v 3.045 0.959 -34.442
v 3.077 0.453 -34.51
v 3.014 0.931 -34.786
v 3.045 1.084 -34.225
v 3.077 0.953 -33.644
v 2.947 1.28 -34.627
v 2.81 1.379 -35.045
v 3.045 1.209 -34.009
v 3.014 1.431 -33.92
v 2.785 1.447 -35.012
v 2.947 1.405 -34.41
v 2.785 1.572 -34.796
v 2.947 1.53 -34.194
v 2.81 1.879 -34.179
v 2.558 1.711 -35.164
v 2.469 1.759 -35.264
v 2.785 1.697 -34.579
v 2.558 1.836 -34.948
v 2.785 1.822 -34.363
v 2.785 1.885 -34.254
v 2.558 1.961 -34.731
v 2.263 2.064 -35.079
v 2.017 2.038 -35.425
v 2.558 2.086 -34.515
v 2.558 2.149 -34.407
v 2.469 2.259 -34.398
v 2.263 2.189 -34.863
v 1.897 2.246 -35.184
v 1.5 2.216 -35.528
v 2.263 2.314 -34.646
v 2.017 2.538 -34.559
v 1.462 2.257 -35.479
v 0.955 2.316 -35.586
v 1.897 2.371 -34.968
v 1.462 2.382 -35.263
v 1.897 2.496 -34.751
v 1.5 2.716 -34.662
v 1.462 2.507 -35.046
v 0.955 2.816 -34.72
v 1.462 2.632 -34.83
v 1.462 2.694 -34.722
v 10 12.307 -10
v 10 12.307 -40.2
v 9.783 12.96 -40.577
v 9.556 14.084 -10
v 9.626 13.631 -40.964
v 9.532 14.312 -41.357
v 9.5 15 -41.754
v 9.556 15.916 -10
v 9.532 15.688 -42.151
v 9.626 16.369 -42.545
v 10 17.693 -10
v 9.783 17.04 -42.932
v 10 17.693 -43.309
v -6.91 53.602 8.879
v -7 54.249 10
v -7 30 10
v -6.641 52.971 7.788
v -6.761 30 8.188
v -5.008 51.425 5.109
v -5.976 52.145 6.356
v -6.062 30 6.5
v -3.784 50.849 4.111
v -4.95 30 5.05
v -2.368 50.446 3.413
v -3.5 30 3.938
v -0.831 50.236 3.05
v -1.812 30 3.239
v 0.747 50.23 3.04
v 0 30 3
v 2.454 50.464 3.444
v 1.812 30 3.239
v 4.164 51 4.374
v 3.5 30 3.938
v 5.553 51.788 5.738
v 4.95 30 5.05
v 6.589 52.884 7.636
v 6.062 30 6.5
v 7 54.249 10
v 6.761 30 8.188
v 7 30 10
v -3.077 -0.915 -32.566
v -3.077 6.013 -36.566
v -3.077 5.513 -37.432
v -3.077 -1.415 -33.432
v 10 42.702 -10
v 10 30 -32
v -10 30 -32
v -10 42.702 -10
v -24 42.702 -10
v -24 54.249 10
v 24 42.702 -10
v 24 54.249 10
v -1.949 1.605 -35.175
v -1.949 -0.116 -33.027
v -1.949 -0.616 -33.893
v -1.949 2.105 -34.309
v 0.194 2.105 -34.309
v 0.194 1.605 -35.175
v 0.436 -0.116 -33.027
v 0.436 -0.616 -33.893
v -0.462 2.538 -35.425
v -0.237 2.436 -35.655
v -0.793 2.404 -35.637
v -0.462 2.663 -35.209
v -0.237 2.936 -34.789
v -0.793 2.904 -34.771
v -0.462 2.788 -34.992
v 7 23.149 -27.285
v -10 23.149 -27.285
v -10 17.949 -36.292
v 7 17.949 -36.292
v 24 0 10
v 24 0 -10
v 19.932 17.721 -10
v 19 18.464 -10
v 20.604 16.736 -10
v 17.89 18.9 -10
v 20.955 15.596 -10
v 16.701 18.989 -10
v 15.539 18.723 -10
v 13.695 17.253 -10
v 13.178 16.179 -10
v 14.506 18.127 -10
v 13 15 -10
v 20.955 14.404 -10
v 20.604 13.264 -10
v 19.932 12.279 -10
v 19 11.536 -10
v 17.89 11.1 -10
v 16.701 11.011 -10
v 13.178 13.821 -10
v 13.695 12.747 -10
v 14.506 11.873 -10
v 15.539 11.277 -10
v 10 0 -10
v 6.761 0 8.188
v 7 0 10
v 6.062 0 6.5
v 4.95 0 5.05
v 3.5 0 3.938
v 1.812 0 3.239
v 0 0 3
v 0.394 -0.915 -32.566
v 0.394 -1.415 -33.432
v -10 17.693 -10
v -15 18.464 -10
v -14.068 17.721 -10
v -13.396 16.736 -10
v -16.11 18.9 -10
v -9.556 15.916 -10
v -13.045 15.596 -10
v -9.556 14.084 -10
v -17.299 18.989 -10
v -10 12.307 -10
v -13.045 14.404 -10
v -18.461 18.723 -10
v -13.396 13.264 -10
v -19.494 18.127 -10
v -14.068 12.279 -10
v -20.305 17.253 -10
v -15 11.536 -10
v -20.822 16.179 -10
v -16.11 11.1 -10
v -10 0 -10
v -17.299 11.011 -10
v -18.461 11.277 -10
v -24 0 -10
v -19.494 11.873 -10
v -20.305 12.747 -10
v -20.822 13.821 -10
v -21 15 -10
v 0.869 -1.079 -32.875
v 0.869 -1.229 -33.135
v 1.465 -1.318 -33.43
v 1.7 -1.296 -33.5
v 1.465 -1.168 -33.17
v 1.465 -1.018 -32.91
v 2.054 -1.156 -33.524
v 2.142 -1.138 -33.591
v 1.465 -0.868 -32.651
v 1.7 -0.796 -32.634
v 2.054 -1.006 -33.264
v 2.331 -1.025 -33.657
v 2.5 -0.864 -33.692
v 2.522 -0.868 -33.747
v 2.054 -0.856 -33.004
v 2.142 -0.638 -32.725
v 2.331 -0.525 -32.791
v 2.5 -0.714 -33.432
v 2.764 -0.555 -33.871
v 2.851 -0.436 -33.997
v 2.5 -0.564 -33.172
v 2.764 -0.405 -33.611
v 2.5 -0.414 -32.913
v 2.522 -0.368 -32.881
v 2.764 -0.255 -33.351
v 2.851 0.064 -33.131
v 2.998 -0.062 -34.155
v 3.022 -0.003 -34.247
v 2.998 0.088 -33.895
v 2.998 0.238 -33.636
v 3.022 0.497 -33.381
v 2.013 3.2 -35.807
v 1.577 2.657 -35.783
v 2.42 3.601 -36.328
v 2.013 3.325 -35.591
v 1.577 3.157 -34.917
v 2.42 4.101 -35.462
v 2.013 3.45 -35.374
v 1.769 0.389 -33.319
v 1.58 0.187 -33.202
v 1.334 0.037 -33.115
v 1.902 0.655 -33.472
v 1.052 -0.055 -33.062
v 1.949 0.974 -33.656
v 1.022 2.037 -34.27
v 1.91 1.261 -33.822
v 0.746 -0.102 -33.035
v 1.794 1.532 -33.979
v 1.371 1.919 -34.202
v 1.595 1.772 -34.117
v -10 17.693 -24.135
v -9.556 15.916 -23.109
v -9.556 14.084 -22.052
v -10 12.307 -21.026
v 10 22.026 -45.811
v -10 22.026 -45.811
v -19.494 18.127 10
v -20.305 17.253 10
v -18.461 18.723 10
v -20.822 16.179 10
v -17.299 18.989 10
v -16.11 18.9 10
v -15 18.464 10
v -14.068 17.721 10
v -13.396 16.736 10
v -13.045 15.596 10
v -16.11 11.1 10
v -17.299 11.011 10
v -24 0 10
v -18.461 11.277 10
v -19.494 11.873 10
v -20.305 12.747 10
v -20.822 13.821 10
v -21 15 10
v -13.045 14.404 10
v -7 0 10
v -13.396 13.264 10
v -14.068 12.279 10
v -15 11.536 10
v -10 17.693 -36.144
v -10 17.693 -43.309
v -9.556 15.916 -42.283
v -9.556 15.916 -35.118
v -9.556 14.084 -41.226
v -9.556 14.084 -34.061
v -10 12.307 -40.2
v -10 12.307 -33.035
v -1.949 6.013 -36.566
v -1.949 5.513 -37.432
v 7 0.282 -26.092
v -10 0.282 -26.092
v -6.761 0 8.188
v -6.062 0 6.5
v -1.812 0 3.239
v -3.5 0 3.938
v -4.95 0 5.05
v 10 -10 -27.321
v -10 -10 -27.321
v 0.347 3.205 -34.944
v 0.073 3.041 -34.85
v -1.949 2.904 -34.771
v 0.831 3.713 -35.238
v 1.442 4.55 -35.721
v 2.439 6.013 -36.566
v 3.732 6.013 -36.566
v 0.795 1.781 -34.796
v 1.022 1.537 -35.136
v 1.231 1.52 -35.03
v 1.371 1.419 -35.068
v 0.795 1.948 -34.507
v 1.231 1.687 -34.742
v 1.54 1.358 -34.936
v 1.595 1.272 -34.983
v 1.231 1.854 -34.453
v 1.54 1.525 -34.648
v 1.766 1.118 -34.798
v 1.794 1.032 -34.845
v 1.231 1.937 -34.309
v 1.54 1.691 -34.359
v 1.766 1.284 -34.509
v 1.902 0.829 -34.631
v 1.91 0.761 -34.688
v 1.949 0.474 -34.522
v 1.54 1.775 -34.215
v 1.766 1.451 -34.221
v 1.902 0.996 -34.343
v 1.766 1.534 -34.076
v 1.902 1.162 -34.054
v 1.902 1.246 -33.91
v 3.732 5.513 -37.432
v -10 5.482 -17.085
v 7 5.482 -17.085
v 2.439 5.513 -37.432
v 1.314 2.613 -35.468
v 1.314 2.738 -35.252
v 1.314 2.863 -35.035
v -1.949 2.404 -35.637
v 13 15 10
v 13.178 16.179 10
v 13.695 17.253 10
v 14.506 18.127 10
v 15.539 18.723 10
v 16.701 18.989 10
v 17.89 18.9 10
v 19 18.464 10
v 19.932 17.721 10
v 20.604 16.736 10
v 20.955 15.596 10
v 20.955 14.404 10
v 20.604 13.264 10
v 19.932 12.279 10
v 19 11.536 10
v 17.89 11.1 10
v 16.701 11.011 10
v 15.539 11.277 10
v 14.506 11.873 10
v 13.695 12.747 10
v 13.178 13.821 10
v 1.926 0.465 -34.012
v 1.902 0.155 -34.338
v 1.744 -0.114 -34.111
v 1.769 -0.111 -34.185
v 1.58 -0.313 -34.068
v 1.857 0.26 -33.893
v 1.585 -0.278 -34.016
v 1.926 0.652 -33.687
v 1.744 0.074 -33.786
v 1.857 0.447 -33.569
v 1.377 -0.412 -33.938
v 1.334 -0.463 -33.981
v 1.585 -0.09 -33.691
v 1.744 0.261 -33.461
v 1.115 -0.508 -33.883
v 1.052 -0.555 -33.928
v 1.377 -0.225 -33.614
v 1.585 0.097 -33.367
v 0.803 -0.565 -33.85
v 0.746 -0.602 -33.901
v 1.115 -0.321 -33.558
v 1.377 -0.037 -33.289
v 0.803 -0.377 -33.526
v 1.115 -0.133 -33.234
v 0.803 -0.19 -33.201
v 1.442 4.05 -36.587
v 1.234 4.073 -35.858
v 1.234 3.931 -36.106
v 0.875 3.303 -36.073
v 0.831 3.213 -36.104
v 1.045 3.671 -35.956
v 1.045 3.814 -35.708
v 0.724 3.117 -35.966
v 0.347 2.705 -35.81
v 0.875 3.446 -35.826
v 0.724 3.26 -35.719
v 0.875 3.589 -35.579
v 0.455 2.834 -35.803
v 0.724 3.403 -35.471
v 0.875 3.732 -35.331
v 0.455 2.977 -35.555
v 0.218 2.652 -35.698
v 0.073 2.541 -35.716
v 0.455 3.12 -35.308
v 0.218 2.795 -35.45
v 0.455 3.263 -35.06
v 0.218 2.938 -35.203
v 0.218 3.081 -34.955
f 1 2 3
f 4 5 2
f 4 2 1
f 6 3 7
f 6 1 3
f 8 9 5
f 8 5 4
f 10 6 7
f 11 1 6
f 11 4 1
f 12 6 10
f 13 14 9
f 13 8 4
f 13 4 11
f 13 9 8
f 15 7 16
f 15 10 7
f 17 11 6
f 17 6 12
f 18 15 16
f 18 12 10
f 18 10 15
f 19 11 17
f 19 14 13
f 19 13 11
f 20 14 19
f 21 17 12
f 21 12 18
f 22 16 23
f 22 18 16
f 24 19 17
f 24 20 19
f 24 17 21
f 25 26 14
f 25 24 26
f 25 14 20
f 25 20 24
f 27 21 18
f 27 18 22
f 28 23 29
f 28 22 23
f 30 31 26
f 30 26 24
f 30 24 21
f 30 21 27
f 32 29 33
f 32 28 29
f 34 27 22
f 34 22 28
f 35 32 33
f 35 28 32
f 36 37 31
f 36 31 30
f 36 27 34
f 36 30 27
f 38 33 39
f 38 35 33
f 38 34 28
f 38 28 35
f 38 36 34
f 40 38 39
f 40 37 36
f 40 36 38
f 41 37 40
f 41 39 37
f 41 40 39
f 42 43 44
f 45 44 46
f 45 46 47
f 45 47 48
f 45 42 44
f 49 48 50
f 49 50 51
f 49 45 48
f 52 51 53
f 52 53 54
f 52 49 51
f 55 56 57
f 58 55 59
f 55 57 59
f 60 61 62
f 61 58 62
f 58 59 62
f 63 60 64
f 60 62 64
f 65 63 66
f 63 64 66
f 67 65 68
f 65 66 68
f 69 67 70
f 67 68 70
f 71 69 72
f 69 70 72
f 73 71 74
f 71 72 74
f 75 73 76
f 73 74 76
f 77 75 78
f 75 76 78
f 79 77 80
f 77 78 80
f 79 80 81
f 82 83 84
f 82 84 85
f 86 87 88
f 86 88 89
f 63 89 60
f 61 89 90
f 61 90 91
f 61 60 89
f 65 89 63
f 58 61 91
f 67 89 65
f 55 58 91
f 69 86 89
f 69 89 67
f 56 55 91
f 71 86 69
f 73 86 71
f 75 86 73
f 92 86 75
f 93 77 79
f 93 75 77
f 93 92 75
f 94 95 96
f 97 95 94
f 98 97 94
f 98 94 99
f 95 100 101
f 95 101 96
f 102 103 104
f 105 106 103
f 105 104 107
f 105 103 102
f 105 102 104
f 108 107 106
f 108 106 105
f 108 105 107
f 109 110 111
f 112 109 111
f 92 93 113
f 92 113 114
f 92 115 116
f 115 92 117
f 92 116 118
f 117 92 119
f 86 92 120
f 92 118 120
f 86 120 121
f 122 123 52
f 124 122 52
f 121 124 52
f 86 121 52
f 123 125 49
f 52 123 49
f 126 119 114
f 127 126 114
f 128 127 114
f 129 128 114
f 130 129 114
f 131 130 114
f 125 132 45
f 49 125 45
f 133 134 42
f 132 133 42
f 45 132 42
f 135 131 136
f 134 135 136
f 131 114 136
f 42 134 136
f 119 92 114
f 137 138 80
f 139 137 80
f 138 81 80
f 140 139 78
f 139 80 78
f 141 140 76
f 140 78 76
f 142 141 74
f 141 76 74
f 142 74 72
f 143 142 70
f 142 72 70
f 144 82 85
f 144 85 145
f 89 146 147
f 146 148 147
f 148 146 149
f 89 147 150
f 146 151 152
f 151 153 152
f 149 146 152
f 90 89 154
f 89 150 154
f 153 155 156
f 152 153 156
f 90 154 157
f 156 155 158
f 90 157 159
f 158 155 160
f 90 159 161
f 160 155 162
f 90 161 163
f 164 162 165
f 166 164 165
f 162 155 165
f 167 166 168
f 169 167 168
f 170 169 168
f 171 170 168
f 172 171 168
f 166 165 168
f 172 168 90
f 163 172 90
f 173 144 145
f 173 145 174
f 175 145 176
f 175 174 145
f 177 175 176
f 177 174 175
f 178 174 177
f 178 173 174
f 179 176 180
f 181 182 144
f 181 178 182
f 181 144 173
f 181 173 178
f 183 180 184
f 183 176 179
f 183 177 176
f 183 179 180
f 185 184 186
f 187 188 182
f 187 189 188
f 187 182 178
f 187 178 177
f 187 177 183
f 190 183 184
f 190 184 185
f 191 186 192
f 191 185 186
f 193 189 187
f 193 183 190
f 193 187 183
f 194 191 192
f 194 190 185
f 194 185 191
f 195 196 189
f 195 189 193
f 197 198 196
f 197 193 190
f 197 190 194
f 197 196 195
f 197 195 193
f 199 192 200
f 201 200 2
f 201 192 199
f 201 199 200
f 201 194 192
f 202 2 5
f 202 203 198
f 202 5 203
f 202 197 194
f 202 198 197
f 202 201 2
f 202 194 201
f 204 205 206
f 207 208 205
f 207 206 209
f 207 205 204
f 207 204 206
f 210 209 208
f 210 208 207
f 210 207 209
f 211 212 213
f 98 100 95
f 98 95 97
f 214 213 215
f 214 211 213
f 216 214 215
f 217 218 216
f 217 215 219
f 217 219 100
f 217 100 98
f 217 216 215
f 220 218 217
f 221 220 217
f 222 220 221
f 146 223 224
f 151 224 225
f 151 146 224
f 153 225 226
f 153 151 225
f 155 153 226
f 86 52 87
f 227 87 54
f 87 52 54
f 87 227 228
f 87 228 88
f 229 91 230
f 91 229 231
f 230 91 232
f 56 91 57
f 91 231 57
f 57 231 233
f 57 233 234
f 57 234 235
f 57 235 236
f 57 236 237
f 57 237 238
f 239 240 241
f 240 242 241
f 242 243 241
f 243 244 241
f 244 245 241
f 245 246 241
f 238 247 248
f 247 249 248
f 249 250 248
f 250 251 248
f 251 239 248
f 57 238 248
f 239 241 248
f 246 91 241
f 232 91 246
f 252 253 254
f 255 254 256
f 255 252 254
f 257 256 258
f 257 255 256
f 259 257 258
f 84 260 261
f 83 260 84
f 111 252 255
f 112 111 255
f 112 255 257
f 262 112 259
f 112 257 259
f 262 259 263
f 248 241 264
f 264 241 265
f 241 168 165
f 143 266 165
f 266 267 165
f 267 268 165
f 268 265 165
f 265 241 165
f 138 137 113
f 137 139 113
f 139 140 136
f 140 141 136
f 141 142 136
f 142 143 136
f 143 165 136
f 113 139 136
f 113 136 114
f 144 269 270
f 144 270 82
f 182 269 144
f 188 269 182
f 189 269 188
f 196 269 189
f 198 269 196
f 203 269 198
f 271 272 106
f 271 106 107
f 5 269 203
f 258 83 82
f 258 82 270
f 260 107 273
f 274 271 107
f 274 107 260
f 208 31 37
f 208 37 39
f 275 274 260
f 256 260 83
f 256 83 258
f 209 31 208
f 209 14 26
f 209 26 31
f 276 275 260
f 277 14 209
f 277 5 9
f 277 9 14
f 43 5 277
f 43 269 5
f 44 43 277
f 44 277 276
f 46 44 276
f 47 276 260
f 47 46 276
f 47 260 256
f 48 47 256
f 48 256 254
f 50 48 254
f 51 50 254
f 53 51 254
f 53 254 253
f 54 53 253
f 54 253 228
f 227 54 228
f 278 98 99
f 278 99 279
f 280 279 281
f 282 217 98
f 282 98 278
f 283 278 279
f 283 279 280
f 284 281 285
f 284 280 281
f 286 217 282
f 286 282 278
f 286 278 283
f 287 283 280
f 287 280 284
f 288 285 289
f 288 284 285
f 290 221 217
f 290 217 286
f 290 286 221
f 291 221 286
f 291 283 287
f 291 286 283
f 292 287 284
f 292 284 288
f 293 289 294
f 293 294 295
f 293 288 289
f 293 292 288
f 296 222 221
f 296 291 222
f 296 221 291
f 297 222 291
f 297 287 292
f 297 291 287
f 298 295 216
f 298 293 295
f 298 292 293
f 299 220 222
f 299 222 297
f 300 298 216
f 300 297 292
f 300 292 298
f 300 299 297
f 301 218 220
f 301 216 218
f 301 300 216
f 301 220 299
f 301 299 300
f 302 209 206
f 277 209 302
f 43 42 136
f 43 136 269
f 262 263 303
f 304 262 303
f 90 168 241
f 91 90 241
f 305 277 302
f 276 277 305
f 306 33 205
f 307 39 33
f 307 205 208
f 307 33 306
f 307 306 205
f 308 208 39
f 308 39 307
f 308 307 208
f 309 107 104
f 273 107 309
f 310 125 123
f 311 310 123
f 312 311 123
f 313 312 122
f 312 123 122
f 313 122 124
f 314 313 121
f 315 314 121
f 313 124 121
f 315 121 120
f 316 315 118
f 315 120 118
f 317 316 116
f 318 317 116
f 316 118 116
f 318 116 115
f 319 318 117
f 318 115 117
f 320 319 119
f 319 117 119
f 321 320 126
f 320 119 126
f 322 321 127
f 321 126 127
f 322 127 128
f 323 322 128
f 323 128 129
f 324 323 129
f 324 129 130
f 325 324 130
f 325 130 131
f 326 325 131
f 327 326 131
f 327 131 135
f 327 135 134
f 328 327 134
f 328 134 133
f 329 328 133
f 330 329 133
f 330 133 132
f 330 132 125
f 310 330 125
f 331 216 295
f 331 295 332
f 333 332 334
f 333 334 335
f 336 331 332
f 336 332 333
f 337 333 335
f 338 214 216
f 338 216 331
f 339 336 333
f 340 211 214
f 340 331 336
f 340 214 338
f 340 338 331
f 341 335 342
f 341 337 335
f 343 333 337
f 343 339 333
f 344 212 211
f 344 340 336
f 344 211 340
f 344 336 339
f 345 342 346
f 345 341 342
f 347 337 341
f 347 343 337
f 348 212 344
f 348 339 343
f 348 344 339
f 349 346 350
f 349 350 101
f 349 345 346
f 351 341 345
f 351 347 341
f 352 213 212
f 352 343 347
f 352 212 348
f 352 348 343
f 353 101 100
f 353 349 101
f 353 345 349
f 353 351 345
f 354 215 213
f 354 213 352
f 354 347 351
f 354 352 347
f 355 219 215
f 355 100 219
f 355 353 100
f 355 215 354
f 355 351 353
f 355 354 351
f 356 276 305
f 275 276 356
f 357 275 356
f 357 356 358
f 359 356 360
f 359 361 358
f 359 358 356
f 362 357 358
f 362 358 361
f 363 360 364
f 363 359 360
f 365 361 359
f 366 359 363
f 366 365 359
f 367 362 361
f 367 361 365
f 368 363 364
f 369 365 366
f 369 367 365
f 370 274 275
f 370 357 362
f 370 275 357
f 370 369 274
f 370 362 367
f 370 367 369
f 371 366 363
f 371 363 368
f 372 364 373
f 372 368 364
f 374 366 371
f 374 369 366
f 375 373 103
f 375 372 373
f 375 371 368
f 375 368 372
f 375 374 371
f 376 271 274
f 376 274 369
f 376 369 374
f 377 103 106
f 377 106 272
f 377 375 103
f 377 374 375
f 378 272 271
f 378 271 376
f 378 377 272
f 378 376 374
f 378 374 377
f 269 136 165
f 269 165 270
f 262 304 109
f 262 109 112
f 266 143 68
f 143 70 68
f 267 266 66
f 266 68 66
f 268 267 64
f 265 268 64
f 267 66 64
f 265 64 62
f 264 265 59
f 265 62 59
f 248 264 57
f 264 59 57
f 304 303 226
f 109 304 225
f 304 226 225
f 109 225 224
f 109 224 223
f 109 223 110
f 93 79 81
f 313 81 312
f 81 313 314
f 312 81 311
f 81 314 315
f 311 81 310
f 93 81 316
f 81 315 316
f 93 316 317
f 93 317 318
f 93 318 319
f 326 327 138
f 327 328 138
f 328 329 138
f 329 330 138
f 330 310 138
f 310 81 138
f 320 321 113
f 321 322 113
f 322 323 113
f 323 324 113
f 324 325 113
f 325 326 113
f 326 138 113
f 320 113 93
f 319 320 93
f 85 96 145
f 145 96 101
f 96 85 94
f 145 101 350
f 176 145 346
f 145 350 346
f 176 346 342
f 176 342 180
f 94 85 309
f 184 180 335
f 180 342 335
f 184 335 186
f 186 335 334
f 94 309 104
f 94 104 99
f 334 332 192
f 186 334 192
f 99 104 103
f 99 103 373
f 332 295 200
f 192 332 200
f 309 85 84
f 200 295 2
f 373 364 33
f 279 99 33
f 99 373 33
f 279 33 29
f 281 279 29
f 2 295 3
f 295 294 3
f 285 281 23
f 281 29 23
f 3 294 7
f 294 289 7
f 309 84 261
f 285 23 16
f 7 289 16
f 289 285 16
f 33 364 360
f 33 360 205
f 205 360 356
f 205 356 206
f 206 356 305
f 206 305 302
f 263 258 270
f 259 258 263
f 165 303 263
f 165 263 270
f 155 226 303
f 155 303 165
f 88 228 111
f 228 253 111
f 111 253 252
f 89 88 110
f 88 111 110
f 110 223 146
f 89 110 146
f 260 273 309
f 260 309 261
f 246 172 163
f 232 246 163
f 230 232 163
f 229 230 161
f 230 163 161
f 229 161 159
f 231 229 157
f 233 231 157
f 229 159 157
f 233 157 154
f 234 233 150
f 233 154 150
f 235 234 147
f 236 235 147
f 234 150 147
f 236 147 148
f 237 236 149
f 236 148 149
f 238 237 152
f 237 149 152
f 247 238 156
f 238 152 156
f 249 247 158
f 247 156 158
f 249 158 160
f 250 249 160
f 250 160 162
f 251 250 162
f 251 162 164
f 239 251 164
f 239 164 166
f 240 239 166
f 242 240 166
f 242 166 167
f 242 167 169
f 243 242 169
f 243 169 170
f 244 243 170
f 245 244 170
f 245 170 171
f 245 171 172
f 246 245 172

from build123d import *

# Parameters (mm, degrees)
SKETCH_1_W              = 48
SKETCH_1_H              = 20
EXTRUDE_1_DEPTH         = 30
SKETCH_2_W              = 14
SKETCH_2_H              = 30
CUT_EXTRUDE_1_DEPTH     = 7
EXTRUDE_2_DEPTH         = 48
CUT_EXTRUDE_2_DEPTH     = 14
CUT_EXTRUDE_3_DEPTH     = 14
CUT_EXTRUDE_4_DEPTH     = 65.456478054
SKETCH_13_R             = 4
CUT_EXTRUDE_5_DEPTH     = 53.52066051
SKETCH_14_R             = 4
CUT_EXTRUDE_6_DEPTH     = 53.52066051
FILLET_1_R              = 7
EXTRUDE_3_DEPTH         = 3
EXTRUDE_5_DEPTH         = 1
SKETCH_20_R             = 7.5
CUT_EXTRUDE_8_DEPTH     = 53.520660579
BOSS_EXTRUDE1_DEPTH     = 25
CUT_EXTRUDE1_DEPTH      = 80.244164279
CUT_EXTRUDE1_DEPTH_BACK = 80.244164279


with BuildPart() as part:
    # Эскиз1 → Бобышка-Вытянуть1 (new body)
    with BuildSketch(Plane(origin=(0, 0, 0), x_dir=(1, 0, 0), z_dir=(0, 1, 0))):
        Rectangle(SKETCH_1_W, SKETCH_1_H)
    extrude(amount=EXTRUDE_1_DEPTH)

    # Эскиз2 → Вырез-Вытянуть1 (cut)
    with BuildSketch(Plane.XY.offset(10)):
        with Locations((0, 15)):
            Rectangle(SKETCH_2_W, SKETCH_2_H)
    extrude(amount=-CUT_EXTRUDE_1_DEPTH, mode=Mode.SUBTRACT)

    # Эскиз7 → Бобышка-Вытянуть2 (add)
    with BuildSketch(Plane(origin=(24, 0, 0), x_dir=(0, 0, -1), z_dir=(1, 0, 0))):
        Polygon((10, 0), (27.320508076, -10), (45.810889132, 22.026279442), (32, 30), (10, 30), align=None)
    extrude(amount=-EXTRUDE_2_DEPTH)

    # Эскиз8 → Вырез-Вытянуть2 (cut)
    with BuildSketch(Plane(origin=(24, 0, 0), x_dir=(0, 0, -1), z_dir=(1, 0, 0))):
        Polygon((10, 0), (10, 30), (32, 30), (45.810889132, 22.026279442), (27.320508076, -10), align=None)
    extrude(amount=-CUT_EXTRUDE_2_DEPTH, mode=Mode.SUBTRACT)

    # Эскиз9 → Вырез-Вытянуть3 (cut)
    with BuildSketch(Plane.ZY.offset(24)):
        Polygon((-10, 0), (-10, 30), (-32, 30), (-45.810889132, 22.026279442), (-27.320508076, -10), align=None)
    extrude(amount=-CUT_EXTRUDE_3_DEPTH, mode=Mode.SUBTRACT)

    # Эскиз11 → Вырез-Вытянуть4 (cut, through all)
    with BuildSketch(Plane.ZY.offset(10)):
        Polygon((-17.085266521, 5.482226936), (-27.285266521, 23.149145173), (-36.291930721, 17.949145173), (-26.091930721, 0.282226936), align=None)
    extrude(amount=-CUT_EXTRUDE_4_DEPTH, mode=Mode.SUBTRACT)

    # Эскиз13 → Вырез-Вытянуть5 (cut, through all)
    with BuildSketch(Plane(origin=(0, 0, -10), x_dir=(-1, 0, 0), z_dir=(0, 0, -1))):
        with Locations((17, 15)):
            Circle(SKETCH_13_R)
    extrude(amount=-CUT_EXTRUDE_5_DEPTH, mode=Mode.SUBTRACT)

    # Эскиз14 → Вырез-Вытянуть6 (cut, through all)
    with BuildSketch(Plane(origin=(0, 0, -10), x_dir=(-1, 0, 0), z_dir=(0, 0, -1))):
        with Locations((-17, 15)):
            Circle(SKETCH_14_R)
    extrude(amount=-CUT_EXTRUDE_6_DEPTH, mode=Mode.SUBTRACT)

    # Скругление1
    fillet_1_edges = [part.edges().sort_by_distance(p)[0] for p in [
        (-7, 15, 3),
        (7, 15, 3),
    ]]
    fillet(fillet_1_edges, radius=FILLET_1_R - 0.0001)  # a hair under: the kernel refuses the full size

    # Эскиз16 → Бобышка-Вытянуть3 (add)
    with BuildSketch(Plane(origin=(10, 0, 0), x_dir=(0, 0, -1), z_dir=(1, 0, 0))):
        Polygon((27.285266521, 23.149145173), (17.085266521, 5.482226936), (26.091930721, 0.282226936), (36.291930721, 17.949145173), align=None)
    extrude(amount=-EXTRUDE_3_DEPTH)

    # Эскиз18 → Бобышка-Вытянуть5 (add)
    with BuildSketch(Plane(origin=(0, -14.330127019, -24.820508076), x_dir=(-1, 0, 0), z_dir=(0, -0.4999999999999885, -0.8660254037844454))):
        with BuildLine():
            Line((3.076923077, 23.490381057), (3.076923077, 15.490381057))
            Line((3.076923077, 15.490381057), (-0.394230769, 15.490381057))
            add(Edge.make_bspline(
                [(-0.394230769, 15.490381057), (-0.475966203, 15.49101845), (-0.634155568, 15.49225205), (-0.863556464, 15.501067061), (-1.077173272, 15.519794557), (-1.276352297, 15.540710881), (-1.460752713, 15.571594241), (-1.630462401, 15.607825992), (-1.784830485, 15.650647709), (-1.925031539, 15.701264755), (-2.055118116, 15.758511595), (-2.175664232, 15.829183977), (-2.291845901, 15.906492451), (-2.399031866, 15.998074814), (-2.502049745, 16.096470161), (-2.596586483, 16.206601733), (-2.685439891, 16.325713037), (-2.793473896, 16.498197991), (-2.906939016, 16.729401784), (-3.004668447, 17.02314385), (-3.06681146, 17.330727068), (-3.073519576, 17.5408315), (-3.076923077, 17.647432339)],
                knots=[0, 0, 0, 0, 1.242075696, 2.40389213, 3.487198984, 4.500157661, 5.446319301, 6.326791195, 7.136300648, 7.878370406, 8.590488565, 9.292260633, 9.999224673, 10.708050372, 11.431369221, 12.162165018, 12.910600795, 13.687589445, 15.252257874, 16.810406251, 18.381693487, 20, 20, 20, 20], degree=3))
            add(Edge.make_bspline(
                [(-3.076923077, 17.647432339), (-3.075357604, 17.715865612), (-3.072265688, 17.851026019), (-3.048581646, 18.049748215), (-3.005726368, 18.239618444), (-2.950775925, 18.42230348), (-2.87555432, 18.595200652), (-2.788453183, 18.761894703), (-2.680395045, 18.917607923), (-2.559742342, 19.067544403), (-2.419445088, 19.204937793), (-2.263386964, 19.331922341), (-2.086876234, 19.440896432), (-1.89570213, 19.542168691), (-1.684937787, 19.625339579), (-1.457761732, 19.698574242), (-1.21241575, 19.755040234), (-1.042362796, 19.783482773), (-0.955128205, 19.798073364)],
                knots=[0, 0, 0, 0, 0.982645791, 1.940792824, 2.867691729, 3.775150443, 4.675643875, 5.571354211, 6.471357401, 7.392684514, 8.331098131, 9.285922955, 10.275520706, 11.304845665, 12.388884831, 13.524255008, 14.729980297, 16, 16, 16, 16], degree=3))
            add(Edge.make_bspline(
                [(-0.955128205, 19.798073364), (-1.019738399, 19.830278555), (-1.14226585, 19.891352818), (-1.308999482, 19.992404668), (-1.455065559, 20.087536339), (-1.53803712, 20.158871679), (-1.576923077, 20.192304134)],
                knots=[0, 0, 0, 0, 1.172551213, 2.223638478, 3.167479604, 4, 4, 4, 4], degree=3))
            add(Edge.make_bspline(
                [(-1.576923077, 20.192304134), (-1.652624383, 20.266285408), (-1.807875296, 20.418008818), (-2.019735444, 20.678834883), (-2.229368535, 20.965668904), (-2.355227865, 21.174690137), (-2.419871795, 21.282047723)],
                knots=[0, 0, 0, 0, 0.918170575, 1.883016652, 2.912673989, 4, 4, 4, 4], degree=3))
            Line((-2.419871795, 21.282047723), (-3.732371795, 23.490381057))
            Line((-3.732371795, 23.490381057), (-2.439102564, 23.490381057))
            Line((-2.439102564, 23.490381057), (-1.442307692, 21.801278493))
            add(Edge.make_bspline(
                [(-1.442307692, 21.801278493), (-1.406465761, 21.74201577), (-1.337009983, 21.627174345), (-1.236719552, 21.459429826), (-1.138255761, 21.30508177), (-1.047376022, 21.15932531), (-0.958316878, 21.02600434), (-0.878481314, 20.900073272), (-0.798305584, 20.788666158), (-0.706246053, 20.654823189), (-0.593818414, 20.510114732), (-0.462623309, 20.361457059), (-0.34199814, 20.238315643), (-0.18956943, 20.120822362), (-3.2323e-05, 20.013245791), (0.159774488, 19.962214344), (0.237179487, 19.937496441)],
                knots=[0, 0, 0, 0, 1.130591283, 2.190900266, 3.190104209, 4.119071823, 4.994606968, 5.807262858, 6.55236009, 7.234593472, 8.459046683, 9.540234366, 10.471327768, 11.266723835, 12.676093724, 14, 14, 14, 14], degree=3))
            add(Edge.make_bspline(
                [(0.237179487, 19.937496441), (0.269697183, 19.931632396), (0.343936058, 19.918244603), (0.469993483, 19.909501015), (0.622727518, 19.900220866), (0.733416476, 19.900491258), (0.793269231, 19.900637467)],
                knots=[0, 0, 0, 0, 0.709978628, 1.620902492, 2.713552433, 4, 4, 4, 4], degree=3))
            Line((0.793269231, 19.900637467), (1.948717949, 19.900637467))
            Line((1.948717949, 19.900637467), (1.948717949, 23.490381057))
            Line((1.948717949, 23.490381057), (3.076923077, 23.490381057))
        make_face()
        with BuildLine():
            Line((1.948717949, 18.977560544), (-0.193910256, 18.977560544))
            add(Edge.make_bspline(
                [(-0.193910256, 18.977560544), (-0.301354607, 18.97589409), (-0.502211742, 18.972778811), (-0.783007271, 18.945769758), (-1.023200158, 18.903550736), (-1.225858519, 18.839427155), (-1.396173113, 18.753553027), (-1.54378517, 18.648537277), (-1.667901131, 18.51825252), (-1.769975791, 18.368861713), (-1.849770319, 18.206056724), (-1.90552669, 18.03374763), (-1.942959563, 17.855238544), (-1.946787014, 17.733092852), (-1.948717949, 17.6714708)],
                knots=[0, 0, 0, 0, 1.546056516, 2.890207646, 4.055830773, 5.050253158, 5.937355789, 6.790906573, 7.644595853, 8.512568064, 9.38593768, 10.244184789, 11.114197691, 12, 12, 12, 12], degree=3))
            add(Edge.make_bspline(
                [(-1.948717949, 17.6714708), (-1.947235583, 17.626563151), (-1.944332064, 17.538602257), (-1.928948857, 17.409542216), (-1.89968097, 17.287236957), (-1.859266003, 17.17080484), (-1.808094758, 17.059993077), (-1.745213393, 16.955237495), (-1.670946372, 16.857073145), (-1.585753391, 16.765016757), (-1.487970747, 16.681241729), (-1.376270424, 16.608965458), (-1.251544399, 16.547545272), (-1.113644587, 16.498798364), (-0.963006292, 16.459808698), (-0.798771701, 16.43387015), (-0.621691971, 16.415101097), (-0.498985984, 16.414015918), (-0.435897436, 16.41345798)],
                knots=[0, 0, 0, 0, 0.965235723, 1.89061323, 2.787065514, 3.661873922, 4.534873316, 5.404925039, 6.281839248, 7.175200054, 8.095223355, 9.040740021, 10.02630299, 11.075573487, 12.177989335, 13.364883635, 14.645170704, 16, 16, 16, 16], degree=3))
            Line((-0.435897436, 16.41345798), (1.948717949, 16.41345798))
            Line((1.948717949, 16.41345798), (1.948717949, 18.977560544))
        make_face(mode=Mode.SUBTRACT)
    extrude(amount=EXTRUDE_5_DEPTH)

    # Эскиз20 → Вырез-Вытянуть8 (cut, through all)
    with BuildSketch(Plane(origin=(0, 0, -10), x_dir=(-1, 0, 0), z_dir=(0, 0, -1))):
        with Locations((-17, 15)):
            Circle(SKETCH_20_R)
        with Locations((17, 15)):
            Circle(SKETCH_20_R)
    extrude(amount=CUT_EXTRUDE_8_DEPTH, mode=Mode.SUBTRACT)

    # Sketch3 → Boss-Extrude1 (add)
    with BuildSketch(Plane(origin=(0, 30, 0), x_dir=(1, 0, 0), z_dir=(0, 1, 0))):
        with BuildLine():
            Line((7, -10), (24, -10))
            Line((24, -10), (24, 10))
            Line((24, 10), (10, 10))
            Line((10, 10), (10, 32))
            Line((10, 32), (-10, 32))
            Line((-10, 32), (-10, 10))
            Line((-10, 10), (-24, 10))
            Line((-24, 10), (-24, -10))
            Line((-24, -10), (-7, -10))
            ThreePointArc((-7, -10), (0, -3), (7, -10))
        make_face()
    extrude(amount=BOSS_EXTRUDE1_DEPTH)

    # Sketch4 → Cut-Extrude1 (cut, two sides: drawn at the far end of the back side and taken through both)
    with BuildSketch(Plane.ZY.offset(10).offset(-CUT_EXTRUDE1_DEPTH_BACK)):
        Polygon((-251.050138586, -96.468656479), (-45.810889132, 22.026279442), (35.63071017, 69.046608722), (240.869959624, 187.541544642), (3.880087783, 598.020043549), (-488.040010426, 314.009842428), align=None)
    extrude(amount=CUT_EXTRUDE1_DEPTH + CUT_EXTRUDE1_DEPTH_BACK, mode=Mode.SUBTRACT)


solid = part.part
